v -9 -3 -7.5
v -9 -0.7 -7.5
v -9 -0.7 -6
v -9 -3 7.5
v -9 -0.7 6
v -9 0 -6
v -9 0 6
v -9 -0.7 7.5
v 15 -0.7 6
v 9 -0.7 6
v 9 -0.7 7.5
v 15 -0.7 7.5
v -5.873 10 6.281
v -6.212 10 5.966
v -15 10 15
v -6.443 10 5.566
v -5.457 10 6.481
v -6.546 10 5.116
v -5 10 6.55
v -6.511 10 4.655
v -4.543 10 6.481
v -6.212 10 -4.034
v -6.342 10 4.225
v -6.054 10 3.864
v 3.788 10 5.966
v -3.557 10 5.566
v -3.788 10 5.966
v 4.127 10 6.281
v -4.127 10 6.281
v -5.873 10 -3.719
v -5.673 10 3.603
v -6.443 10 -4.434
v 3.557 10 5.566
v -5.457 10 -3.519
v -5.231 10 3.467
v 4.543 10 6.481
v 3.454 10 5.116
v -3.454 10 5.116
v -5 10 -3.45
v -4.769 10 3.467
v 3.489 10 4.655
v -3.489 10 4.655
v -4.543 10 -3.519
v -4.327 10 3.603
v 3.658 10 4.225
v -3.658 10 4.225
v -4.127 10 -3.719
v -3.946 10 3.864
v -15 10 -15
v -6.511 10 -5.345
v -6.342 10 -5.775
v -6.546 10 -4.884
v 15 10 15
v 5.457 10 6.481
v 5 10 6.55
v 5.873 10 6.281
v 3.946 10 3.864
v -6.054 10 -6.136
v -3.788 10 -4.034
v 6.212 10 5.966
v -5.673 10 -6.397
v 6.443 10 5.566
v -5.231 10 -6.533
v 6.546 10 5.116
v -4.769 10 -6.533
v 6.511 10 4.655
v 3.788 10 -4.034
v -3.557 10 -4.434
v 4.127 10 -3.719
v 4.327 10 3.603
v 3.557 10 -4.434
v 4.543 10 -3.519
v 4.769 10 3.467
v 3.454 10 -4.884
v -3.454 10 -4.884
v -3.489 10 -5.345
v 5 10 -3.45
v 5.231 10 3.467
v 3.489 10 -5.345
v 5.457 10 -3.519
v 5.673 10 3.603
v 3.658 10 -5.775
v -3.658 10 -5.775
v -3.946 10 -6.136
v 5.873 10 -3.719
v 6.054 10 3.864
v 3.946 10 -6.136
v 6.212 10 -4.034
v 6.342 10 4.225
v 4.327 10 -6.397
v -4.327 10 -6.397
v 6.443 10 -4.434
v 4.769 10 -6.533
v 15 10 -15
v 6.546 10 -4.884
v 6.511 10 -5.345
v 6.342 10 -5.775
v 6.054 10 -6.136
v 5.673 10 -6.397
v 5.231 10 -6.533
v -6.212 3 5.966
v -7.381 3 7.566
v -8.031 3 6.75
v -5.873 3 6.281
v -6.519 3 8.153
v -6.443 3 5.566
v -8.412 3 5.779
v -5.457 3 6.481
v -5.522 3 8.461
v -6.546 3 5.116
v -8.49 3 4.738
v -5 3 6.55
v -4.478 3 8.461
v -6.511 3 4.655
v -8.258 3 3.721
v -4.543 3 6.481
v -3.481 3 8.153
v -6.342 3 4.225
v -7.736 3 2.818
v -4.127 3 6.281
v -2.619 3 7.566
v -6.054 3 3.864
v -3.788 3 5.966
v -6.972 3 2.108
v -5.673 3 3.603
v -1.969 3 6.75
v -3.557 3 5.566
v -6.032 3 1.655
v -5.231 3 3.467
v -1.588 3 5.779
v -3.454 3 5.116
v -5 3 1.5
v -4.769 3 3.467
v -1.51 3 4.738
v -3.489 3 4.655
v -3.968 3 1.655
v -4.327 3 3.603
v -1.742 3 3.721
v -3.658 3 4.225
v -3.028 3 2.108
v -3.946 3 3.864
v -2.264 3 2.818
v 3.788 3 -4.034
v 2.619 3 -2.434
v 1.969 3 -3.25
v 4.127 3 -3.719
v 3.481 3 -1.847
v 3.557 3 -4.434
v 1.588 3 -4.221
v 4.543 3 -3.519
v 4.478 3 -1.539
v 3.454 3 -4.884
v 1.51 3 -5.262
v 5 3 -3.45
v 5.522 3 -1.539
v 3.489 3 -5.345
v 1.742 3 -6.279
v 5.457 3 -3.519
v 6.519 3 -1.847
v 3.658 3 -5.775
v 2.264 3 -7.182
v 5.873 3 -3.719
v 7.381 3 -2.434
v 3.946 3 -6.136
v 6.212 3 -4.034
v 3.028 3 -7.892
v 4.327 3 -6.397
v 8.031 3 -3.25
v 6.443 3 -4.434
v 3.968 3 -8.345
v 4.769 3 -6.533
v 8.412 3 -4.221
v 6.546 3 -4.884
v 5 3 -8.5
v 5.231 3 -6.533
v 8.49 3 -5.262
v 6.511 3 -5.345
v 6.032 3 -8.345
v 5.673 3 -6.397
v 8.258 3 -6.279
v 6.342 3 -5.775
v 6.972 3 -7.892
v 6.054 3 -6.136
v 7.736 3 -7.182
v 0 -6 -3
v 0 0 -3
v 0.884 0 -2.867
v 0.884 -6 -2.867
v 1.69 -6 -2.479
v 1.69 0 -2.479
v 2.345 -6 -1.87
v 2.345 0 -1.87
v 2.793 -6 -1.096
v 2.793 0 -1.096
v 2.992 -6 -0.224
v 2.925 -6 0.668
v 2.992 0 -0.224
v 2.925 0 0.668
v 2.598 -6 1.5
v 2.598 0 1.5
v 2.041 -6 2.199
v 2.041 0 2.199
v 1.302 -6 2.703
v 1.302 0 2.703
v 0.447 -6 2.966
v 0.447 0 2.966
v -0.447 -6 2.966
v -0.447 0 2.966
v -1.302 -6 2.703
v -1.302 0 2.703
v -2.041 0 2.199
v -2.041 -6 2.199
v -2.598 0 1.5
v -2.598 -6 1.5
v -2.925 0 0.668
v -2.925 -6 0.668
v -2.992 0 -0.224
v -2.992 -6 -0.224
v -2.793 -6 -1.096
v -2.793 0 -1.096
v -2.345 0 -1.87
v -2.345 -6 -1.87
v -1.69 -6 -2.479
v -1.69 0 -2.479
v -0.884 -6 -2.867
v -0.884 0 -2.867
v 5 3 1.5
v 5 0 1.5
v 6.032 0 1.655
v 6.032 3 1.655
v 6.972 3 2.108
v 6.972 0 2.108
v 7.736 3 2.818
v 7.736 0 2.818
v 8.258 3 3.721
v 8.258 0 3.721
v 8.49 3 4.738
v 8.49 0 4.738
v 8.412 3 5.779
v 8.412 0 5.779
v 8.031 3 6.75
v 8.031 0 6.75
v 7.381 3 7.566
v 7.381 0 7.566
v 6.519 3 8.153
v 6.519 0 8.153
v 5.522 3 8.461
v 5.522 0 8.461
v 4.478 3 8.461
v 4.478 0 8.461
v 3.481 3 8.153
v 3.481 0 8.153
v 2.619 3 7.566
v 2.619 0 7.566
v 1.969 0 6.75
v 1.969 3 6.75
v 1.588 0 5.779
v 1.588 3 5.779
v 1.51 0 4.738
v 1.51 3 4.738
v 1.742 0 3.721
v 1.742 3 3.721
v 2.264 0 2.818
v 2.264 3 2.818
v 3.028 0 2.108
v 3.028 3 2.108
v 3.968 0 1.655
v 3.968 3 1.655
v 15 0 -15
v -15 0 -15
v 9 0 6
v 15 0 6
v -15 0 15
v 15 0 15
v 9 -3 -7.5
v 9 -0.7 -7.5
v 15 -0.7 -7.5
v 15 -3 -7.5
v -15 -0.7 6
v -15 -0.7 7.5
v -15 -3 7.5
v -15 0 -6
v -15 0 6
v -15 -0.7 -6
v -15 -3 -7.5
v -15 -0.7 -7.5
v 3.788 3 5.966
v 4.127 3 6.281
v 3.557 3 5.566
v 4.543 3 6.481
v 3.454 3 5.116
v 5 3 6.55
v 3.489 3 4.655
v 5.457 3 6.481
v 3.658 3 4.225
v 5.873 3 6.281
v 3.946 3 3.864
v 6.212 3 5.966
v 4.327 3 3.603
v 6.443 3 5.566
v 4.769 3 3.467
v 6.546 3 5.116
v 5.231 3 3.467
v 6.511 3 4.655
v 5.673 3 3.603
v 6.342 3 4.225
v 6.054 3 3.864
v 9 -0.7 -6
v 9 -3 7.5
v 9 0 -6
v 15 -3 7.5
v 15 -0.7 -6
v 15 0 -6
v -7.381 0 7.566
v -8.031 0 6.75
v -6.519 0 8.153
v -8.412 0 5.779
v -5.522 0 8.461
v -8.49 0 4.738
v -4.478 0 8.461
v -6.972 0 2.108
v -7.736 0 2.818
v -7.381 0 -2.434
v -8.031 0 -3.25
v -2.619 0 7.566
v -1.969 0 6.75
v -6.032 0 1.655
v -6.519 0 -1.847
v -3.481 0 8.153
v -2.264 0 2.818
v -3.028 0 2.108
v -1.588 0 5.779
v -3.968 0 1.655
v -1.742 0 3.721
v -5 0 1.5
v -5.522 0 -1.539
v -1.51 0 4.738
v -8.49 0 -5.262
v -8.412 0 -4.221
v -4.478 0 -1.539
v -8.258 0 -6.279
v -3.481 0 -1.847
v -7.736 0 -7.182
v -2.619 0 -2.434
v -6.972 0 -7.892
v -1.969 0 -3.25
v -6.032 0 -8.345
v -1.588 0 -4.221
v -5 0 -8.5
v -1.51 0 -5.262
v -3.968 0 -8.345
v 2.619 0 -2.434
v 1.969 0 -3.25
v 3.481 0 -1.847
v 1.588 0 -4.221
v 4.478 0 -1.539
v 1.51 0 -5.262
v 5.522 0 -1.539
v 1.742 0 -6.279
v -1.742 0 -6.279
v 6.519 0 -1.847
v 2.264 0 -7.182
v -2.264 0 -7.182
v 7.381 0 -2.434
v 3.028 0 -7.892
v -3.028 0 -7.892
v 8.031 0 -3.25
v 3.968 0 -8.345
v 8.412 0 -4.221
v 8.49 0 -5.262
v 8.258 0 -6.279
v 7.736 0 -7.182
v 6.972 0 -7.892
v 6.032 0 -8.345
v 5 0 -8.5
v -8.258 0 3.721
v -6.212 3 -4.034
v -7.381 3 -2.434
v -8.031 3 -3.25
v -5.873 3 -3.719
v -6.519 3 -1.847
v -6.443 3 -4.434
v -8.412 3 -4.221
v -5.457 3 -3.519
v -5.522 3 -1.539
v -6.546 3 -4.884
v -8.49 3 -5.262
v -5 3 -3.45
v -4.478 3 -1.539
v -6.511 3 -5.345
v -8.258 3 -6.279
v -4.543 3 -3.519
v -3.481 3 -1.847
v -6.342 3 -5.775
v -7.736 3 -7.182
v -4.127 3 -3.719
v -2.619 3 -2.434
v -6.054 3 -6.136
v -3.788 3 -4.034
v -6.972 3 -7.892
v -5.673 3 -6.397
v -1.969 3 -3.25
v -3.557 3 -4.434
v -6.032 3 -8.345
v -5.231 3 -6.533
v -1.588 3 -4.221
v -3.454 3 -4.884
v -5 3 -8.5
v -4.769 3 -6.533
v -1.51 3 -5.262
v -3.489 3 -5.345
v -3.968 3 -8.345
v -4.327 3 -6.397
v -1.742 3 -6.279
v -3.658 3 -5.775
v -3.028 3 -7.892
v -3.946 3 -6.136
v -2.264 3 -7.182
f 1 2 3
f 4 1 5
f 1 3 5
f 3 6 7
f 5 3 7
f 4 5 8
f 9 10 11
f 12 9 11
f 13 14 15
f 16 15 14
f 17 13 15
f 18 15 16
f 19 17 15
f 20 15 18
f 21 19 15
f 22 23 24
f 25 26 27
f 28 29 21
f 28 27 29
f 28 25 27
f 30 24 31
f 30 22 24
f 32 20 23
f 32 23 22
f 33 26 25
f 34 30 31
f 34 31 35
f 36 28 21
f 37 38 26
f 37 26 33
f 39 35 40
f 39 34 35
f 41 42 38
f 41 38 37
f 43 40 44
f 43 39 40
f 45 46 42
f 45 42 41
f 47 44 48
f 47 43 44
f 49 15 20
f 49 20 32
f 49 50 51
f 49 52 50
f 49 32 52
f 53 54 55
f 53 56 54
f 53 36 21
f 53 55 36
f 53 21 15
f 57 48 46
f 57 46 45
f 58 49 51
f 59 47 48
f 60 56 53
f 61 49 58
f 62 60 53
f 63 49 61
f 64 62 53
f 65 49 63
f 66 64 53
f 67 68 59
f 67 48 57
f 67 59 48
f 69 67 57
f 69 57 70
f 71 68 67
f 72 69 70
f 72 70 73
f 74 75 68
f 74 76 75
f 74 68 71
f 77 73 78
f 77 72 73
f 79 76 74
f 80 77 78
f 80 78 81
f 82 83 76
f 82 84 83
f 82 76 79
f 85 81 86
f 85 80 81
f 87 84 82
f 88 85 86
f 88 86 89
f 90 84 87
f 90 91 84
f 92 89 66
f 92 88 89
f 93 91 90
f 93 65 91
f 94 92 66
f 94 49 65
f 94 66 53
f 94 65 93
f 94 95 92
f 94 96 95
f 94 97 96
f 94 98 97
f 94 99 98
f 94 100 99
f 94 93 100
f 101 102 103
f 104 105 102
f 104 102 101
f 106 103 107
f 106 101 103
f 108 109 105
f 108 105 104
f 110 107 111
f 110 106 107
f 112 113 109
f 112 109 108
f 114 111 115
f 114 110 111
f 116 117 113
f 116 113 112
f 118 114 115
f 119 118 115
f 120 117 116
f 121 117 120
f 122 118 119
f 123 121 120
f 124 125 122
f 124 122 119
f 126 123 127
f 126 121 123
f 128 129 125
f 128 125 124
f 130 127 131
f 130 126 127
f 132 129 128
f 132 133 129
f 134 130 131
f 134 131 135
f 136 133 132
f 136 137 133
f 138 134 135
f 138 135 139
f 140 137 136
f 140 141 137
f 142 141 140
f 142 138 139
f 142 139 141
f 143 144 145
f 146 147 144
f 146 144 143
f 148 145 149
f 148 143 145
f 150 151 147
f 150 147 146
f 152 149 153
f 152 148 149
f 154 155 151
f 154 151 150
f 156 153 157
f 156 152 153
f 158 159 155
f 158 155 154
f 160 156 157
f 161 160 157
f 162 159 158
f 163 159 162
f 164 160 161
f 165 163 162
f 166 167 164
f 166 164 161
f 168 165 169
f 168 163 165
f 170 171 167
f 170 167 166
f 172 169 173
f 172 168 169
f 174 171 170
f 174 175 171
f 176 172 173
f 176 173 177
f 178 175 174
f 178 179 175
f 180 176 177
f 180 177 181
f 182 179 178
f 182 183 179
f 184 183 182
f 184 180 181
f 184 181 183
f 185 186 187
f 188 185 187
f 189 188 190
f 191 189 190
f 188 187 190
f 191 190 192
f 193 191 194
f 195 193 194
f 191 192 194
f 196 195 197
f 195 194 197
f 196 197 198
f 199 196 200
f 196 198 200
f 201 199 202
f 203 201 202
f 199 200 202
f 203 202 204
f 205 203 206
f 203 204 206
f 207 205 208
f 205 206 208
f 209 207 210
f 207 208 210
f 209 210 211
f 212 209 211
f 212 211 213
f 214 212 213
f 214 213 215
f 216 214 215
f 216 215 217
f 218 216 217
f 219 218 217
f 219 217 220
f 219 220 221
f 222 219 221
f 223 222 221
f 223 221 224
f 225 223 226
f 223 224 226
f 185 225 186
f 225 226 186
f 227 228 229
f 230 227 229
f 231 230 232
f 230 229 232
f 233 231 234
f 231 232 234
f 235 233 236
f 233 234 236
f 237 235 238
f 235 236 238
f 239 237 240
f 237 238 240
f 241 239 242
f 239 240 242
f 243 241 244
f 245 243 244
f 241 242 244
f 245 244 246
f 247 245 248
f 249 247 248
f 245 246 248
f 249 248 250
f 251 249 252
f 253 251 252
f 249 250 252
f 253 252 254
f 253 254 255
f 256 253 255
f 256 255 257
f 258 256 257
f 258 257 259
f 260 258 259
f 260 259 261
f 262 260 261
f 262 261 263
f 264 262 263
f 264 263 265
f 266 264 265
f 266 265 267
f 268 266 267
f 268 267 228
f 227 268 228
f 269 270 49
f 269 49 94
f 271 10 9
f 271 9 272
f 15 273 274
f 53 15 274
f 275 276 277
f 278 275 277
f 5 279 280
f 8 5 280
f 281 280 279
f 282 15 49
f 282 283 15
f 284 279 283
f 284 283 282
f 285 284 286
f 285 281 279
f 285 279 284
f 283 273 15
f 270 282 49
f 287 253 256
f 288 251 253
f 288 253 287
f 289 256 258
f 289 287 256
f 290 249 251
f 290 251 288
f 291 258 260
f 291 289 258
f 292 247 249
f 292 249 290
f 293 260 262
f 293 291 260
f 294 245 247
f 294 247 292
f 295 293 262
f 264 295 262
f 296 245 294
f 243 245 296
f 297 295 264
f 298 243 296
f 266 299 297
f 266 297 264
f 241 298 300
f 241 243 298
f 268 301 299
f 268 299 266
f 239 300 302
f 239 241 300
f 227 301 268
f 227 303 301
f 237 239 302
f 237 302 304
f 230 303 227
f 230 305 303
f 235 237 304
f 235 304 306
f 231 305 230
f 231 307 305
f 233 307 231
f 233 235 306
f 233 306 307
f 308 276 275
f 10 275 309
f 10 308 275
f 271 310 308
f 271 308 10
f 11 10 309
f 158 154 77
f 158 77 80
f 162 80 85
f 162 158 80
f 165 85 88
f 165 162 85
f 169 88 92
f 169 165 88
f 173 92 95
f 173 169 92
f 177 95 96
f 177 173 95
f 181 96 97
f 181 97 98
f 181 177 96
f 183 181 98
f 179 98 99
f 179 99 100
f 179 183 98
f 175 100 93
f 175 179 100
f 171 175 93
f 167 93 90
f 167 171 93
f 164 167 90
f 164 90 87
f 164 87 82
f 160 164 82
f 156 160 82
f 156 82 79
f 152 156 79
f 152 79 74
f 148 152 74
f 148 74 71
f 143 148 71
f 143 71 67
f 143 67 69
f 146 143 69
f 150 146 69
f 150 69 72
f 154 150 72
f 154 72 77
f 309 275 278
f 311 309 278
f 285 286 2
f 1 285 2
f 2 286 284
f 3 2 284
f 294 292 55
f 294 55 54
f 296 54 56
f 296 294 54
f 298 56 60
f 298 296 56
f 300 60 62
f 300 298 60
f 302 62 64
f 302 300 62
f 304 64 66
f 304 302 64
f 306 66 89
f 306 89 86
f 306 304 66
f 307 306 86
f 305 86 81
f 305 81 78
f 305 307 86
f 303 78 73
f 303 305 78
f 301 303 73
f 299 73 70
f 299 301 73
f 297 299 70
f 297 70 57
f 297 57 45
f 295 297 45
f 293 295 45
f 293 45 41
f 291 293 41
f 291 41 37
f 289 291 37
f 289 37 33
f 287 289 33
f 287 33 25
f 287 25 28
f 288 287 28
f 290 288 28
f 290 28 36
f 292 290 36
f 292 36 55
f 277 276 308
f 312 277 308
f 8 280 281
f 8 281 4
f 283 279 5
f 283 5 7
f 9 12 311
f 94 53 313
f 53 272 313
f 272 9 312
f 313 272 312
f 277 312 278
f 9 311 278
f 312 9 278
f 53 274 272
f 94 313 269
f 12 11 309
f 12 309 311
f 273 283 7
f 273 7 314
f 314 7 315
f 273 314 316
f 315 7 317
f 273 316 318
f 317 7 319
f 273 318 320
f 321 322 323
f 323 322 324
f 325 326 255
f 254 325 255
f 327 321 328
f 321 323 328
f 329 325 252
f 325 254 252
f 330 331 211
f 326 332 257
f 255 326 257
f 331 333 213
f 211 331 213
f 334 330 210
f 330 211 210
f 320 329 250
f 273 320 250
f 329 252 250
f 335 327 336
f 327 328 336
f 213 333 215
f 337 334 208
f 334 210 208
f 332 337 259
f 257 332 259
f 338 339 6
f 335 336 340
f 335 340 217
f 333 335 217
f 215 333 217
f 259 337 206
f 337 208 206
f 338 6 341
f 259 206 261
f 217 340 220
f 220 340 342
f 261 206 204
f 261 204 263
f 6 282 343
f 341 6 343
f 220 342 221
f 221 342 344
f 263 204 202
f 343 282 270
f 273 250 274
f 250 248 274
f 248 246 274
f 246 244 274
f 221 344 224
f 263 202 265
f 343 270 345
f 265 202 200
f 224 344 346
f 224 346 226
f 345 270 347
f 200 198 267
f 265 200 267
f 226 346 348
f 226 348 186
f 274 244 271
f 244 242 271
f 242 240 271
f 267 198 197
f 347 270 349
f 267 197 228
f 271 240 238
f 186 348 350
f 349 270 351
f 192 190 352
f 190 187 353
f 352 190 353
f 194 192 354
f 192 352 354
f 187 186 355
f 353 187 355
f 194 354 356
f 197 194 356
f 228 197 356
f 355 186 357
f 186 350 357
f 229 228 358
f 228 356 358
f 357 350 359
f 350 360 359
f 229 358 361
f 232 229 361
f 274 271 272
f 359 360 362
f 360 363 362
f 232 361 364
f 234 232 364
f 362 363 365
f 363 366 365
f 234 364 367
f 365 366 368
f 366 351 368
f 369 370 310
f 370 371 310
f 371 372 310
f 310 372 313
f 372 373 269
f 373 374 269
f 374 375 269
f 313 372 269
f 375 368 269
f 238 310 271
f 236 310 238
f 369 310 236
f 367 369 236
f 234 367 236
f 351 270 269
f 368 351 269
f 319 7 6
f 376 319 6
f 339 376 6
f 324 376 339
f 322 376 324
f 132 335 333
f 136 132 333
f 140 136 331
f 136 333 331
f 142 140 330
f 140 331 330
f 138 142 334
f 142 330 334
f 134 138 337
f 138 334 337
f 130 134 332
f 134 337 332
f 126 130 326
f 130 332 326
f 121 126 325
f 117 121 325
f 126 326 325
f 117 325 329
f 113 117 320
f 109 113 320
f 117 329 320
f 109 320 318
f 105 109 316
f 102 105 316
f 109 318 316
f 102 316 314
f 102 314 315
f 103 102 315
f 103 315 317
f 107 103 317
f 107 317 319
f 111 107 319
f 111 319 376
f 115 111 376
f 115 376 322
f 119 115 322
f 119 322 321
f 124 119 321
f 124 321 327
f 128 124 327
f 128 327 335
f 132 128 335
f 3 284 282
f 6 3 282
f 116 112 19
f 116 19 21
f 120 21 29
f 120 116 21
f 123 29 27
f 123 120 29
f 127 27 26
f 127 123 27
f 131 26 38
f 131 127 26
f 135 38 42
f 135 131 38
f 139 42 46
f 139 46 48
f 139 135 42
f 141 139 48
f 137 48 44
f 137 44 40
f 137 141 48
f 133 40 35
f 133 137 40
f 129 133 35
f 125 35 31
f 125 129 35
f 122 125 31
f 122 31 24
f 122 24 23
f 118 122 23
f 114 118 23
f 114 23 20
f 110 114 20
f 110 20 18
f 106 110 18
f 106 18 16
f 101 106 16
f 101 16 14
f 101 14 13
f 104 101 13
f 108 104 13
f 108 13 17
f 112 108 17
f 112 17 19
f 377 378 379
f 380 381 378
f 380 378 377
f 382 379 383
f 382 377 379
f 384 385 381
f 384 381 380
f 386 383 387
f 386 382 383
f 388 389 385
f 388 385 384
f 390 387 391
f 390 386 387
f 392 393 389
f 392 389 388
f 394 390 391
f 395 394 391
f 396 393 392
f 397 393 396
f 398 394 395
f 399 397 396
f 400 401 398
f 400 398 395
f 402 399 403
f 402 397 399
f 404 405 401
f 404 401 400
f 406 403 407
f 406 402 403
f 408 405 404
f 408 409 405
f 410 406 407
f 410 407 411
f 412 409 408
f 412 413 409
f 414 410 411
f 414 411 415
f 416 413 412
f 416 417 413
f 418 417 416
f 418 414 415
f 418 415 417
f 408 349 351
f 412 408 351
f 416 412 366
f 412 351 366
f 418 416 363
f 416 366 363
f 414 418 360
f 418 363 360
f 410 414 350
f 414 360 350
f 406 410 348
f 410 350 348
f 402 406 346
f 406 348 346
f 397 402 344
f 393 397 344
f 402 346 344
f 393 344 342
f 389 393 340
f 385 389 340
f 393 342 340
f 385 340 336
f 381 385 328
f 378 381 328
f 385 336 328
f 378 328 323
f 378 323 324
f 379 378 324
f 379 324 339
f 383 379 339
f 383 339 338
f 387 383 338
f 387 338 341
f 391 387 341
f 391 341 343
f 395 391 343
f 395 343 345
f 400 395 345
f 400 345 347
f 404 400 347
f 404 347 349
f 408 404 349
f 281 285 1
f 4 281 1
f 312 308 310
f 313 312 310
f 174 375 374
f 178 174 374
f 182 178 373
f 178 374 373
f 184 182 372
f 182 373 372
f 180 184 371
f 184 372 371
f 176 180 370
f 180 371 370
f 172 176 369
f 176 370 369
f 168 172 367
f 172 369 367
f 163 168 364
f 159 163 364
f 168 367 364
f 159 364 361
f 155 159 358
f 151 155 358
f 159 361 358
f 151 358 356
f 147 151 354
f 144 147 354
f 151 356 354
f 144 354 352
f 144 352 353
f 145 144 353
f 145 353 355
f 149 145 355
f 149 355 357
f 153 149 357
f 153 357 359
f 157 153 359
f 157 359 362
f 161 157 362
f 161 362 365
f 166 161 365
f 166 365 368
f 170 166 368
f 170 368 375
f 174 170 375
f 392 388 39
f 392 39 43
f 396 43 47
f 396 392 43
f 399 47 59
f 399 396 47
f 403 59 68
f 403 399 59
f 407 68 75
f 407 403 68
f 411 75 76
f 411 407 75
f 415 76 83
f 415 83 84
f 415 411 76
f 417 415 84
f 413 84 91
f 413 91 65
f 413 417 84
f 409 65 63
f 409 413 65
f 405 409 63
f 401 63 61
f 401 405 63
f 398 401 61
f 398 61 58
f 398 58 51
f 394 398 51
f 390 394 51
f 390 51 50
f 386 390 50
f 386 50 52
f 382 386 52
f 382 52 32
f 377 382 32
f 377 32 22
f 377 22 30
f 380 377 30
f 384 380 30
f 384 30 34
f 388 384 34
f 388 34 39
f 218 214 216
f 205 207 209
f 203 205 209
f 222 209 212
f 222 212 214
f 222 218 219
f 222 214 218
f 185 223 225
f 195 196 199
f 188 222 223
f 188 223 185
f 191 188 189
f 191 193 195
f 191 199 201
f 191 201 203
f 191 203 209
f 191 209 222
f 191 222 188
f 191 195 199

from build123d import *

# Parameters (mm, degrees)
SKETCH_1_W          = 30
SKETCH_1_H          = 30
SKETCH_1_R          = 1.55
EXTRUDE_1_DEPTH     = 10
SKETCH_2_R          = 3.5
CUT_EXTRUDE_1_DEPTH = 3
SKETCH_3_W          = 6
SKETCH_3_H          = 15
EXTRUDE_3_DEPTH     = 3
SKETCH_5_W          = 1.5
SKETCH_5_H          = 0.7
CUT_EXTRUDE_3_DEPTH = 36
SKETCH_6_R          = 3
EXTRUDE_4_DEPTH     = 6


with BuildPart() as part:
    # 草图1 → 凸台-拉伸1 (new body)
    with BuildSketch(Plane(origin=(0, 0, 0), x_dir=(1, 0, 0), z_dir=(0, 1, 0))):
        Rectangle(SKETCH_1_W, SKETCH_1_H)
        with Locations(Location((-5, 5, 0), (0, 0, 270))):
            Circle(SKETCH_1_R, mode=Mode.SUBTRACT)
        with Locations(Location((5, 5, 0), (0, 0, 270))):
            Circle(SKETCH_1_R, mode=Mode.SUBTRACT)
        with Locations(Location((5, -5, 0), (0, 0, 270))):
            Circle(SKETCH_1_R, mode=Mode.SUBTRACT)
        with Locations(Location((-5, -5, 0), (0, 0, 270))):
            Circle(SKETCH_1_R, mode=Mode.SUBTRACT)
    extrude(amount=EXTRUDE_1_DEPTH)

    # 草图2 → 切除-拉伸1 (cut)
    with BuildSketch(Plane.XZ):
        with Locations(Location((-5, 5, 0), (0, 0, 270))):
            Circle(SKETCH_2_R)
        with Locations(Location((5, 5, 0), (0, 0, 270))):
            Circle(SKETCH_2_R)
        with Locations(Location((5, -5, 0), (0, 0, 270))):
            Circle(SKETCH_2_R)
        with Locations(Location((-5, -5, 0), (0, 0, 270))):
            Circle(SKETCH_2_R)
    extrude(amount=-CUT_EXTRUDE_1_DEPTH, mode=Mode.SUBTRACT)

    # 草图3 → 凸台-拉伸3 (add)
    with BuildSketch(Plane.XZ):
        with Locations((-12, 0)):
            Rectangle(SKETCH_3_W, SKETCH_3_H)
        with Locations((12, 0)):
            Rectangle(SKETCH_3_W, SKETCH_3_H)
    extrude(amount=EXTRUDE_3_DEPTH)

    # 草图5 → 切除-拉伸3 (cut, through all)
    with BuildSketch(Plane.ZY.offset(15)):
        with Locations((-6.75, -0.35)):
            Rectangle(SKETCH_5_W, SKETCH_5_H)
        with Locations((6.75, -0.35)):
            Rectangle(SKETCH_5_W, SKETCH_5_H)
    extrude(amount=-CUT_EXTRUDE_3_DEPTH, mode=Mode.SUBTRACT)

    # 草图6 → 凸台-拉伸4 (add)
    with BuildSketch(Plane.XZ):
        with Locations(Location((0, 0, 0), (0, 0, 270))):
            Circle(SKETCH_6_R)
    extrude(amount=EXTRUDE_4_DEPTH)


solid = part.part
